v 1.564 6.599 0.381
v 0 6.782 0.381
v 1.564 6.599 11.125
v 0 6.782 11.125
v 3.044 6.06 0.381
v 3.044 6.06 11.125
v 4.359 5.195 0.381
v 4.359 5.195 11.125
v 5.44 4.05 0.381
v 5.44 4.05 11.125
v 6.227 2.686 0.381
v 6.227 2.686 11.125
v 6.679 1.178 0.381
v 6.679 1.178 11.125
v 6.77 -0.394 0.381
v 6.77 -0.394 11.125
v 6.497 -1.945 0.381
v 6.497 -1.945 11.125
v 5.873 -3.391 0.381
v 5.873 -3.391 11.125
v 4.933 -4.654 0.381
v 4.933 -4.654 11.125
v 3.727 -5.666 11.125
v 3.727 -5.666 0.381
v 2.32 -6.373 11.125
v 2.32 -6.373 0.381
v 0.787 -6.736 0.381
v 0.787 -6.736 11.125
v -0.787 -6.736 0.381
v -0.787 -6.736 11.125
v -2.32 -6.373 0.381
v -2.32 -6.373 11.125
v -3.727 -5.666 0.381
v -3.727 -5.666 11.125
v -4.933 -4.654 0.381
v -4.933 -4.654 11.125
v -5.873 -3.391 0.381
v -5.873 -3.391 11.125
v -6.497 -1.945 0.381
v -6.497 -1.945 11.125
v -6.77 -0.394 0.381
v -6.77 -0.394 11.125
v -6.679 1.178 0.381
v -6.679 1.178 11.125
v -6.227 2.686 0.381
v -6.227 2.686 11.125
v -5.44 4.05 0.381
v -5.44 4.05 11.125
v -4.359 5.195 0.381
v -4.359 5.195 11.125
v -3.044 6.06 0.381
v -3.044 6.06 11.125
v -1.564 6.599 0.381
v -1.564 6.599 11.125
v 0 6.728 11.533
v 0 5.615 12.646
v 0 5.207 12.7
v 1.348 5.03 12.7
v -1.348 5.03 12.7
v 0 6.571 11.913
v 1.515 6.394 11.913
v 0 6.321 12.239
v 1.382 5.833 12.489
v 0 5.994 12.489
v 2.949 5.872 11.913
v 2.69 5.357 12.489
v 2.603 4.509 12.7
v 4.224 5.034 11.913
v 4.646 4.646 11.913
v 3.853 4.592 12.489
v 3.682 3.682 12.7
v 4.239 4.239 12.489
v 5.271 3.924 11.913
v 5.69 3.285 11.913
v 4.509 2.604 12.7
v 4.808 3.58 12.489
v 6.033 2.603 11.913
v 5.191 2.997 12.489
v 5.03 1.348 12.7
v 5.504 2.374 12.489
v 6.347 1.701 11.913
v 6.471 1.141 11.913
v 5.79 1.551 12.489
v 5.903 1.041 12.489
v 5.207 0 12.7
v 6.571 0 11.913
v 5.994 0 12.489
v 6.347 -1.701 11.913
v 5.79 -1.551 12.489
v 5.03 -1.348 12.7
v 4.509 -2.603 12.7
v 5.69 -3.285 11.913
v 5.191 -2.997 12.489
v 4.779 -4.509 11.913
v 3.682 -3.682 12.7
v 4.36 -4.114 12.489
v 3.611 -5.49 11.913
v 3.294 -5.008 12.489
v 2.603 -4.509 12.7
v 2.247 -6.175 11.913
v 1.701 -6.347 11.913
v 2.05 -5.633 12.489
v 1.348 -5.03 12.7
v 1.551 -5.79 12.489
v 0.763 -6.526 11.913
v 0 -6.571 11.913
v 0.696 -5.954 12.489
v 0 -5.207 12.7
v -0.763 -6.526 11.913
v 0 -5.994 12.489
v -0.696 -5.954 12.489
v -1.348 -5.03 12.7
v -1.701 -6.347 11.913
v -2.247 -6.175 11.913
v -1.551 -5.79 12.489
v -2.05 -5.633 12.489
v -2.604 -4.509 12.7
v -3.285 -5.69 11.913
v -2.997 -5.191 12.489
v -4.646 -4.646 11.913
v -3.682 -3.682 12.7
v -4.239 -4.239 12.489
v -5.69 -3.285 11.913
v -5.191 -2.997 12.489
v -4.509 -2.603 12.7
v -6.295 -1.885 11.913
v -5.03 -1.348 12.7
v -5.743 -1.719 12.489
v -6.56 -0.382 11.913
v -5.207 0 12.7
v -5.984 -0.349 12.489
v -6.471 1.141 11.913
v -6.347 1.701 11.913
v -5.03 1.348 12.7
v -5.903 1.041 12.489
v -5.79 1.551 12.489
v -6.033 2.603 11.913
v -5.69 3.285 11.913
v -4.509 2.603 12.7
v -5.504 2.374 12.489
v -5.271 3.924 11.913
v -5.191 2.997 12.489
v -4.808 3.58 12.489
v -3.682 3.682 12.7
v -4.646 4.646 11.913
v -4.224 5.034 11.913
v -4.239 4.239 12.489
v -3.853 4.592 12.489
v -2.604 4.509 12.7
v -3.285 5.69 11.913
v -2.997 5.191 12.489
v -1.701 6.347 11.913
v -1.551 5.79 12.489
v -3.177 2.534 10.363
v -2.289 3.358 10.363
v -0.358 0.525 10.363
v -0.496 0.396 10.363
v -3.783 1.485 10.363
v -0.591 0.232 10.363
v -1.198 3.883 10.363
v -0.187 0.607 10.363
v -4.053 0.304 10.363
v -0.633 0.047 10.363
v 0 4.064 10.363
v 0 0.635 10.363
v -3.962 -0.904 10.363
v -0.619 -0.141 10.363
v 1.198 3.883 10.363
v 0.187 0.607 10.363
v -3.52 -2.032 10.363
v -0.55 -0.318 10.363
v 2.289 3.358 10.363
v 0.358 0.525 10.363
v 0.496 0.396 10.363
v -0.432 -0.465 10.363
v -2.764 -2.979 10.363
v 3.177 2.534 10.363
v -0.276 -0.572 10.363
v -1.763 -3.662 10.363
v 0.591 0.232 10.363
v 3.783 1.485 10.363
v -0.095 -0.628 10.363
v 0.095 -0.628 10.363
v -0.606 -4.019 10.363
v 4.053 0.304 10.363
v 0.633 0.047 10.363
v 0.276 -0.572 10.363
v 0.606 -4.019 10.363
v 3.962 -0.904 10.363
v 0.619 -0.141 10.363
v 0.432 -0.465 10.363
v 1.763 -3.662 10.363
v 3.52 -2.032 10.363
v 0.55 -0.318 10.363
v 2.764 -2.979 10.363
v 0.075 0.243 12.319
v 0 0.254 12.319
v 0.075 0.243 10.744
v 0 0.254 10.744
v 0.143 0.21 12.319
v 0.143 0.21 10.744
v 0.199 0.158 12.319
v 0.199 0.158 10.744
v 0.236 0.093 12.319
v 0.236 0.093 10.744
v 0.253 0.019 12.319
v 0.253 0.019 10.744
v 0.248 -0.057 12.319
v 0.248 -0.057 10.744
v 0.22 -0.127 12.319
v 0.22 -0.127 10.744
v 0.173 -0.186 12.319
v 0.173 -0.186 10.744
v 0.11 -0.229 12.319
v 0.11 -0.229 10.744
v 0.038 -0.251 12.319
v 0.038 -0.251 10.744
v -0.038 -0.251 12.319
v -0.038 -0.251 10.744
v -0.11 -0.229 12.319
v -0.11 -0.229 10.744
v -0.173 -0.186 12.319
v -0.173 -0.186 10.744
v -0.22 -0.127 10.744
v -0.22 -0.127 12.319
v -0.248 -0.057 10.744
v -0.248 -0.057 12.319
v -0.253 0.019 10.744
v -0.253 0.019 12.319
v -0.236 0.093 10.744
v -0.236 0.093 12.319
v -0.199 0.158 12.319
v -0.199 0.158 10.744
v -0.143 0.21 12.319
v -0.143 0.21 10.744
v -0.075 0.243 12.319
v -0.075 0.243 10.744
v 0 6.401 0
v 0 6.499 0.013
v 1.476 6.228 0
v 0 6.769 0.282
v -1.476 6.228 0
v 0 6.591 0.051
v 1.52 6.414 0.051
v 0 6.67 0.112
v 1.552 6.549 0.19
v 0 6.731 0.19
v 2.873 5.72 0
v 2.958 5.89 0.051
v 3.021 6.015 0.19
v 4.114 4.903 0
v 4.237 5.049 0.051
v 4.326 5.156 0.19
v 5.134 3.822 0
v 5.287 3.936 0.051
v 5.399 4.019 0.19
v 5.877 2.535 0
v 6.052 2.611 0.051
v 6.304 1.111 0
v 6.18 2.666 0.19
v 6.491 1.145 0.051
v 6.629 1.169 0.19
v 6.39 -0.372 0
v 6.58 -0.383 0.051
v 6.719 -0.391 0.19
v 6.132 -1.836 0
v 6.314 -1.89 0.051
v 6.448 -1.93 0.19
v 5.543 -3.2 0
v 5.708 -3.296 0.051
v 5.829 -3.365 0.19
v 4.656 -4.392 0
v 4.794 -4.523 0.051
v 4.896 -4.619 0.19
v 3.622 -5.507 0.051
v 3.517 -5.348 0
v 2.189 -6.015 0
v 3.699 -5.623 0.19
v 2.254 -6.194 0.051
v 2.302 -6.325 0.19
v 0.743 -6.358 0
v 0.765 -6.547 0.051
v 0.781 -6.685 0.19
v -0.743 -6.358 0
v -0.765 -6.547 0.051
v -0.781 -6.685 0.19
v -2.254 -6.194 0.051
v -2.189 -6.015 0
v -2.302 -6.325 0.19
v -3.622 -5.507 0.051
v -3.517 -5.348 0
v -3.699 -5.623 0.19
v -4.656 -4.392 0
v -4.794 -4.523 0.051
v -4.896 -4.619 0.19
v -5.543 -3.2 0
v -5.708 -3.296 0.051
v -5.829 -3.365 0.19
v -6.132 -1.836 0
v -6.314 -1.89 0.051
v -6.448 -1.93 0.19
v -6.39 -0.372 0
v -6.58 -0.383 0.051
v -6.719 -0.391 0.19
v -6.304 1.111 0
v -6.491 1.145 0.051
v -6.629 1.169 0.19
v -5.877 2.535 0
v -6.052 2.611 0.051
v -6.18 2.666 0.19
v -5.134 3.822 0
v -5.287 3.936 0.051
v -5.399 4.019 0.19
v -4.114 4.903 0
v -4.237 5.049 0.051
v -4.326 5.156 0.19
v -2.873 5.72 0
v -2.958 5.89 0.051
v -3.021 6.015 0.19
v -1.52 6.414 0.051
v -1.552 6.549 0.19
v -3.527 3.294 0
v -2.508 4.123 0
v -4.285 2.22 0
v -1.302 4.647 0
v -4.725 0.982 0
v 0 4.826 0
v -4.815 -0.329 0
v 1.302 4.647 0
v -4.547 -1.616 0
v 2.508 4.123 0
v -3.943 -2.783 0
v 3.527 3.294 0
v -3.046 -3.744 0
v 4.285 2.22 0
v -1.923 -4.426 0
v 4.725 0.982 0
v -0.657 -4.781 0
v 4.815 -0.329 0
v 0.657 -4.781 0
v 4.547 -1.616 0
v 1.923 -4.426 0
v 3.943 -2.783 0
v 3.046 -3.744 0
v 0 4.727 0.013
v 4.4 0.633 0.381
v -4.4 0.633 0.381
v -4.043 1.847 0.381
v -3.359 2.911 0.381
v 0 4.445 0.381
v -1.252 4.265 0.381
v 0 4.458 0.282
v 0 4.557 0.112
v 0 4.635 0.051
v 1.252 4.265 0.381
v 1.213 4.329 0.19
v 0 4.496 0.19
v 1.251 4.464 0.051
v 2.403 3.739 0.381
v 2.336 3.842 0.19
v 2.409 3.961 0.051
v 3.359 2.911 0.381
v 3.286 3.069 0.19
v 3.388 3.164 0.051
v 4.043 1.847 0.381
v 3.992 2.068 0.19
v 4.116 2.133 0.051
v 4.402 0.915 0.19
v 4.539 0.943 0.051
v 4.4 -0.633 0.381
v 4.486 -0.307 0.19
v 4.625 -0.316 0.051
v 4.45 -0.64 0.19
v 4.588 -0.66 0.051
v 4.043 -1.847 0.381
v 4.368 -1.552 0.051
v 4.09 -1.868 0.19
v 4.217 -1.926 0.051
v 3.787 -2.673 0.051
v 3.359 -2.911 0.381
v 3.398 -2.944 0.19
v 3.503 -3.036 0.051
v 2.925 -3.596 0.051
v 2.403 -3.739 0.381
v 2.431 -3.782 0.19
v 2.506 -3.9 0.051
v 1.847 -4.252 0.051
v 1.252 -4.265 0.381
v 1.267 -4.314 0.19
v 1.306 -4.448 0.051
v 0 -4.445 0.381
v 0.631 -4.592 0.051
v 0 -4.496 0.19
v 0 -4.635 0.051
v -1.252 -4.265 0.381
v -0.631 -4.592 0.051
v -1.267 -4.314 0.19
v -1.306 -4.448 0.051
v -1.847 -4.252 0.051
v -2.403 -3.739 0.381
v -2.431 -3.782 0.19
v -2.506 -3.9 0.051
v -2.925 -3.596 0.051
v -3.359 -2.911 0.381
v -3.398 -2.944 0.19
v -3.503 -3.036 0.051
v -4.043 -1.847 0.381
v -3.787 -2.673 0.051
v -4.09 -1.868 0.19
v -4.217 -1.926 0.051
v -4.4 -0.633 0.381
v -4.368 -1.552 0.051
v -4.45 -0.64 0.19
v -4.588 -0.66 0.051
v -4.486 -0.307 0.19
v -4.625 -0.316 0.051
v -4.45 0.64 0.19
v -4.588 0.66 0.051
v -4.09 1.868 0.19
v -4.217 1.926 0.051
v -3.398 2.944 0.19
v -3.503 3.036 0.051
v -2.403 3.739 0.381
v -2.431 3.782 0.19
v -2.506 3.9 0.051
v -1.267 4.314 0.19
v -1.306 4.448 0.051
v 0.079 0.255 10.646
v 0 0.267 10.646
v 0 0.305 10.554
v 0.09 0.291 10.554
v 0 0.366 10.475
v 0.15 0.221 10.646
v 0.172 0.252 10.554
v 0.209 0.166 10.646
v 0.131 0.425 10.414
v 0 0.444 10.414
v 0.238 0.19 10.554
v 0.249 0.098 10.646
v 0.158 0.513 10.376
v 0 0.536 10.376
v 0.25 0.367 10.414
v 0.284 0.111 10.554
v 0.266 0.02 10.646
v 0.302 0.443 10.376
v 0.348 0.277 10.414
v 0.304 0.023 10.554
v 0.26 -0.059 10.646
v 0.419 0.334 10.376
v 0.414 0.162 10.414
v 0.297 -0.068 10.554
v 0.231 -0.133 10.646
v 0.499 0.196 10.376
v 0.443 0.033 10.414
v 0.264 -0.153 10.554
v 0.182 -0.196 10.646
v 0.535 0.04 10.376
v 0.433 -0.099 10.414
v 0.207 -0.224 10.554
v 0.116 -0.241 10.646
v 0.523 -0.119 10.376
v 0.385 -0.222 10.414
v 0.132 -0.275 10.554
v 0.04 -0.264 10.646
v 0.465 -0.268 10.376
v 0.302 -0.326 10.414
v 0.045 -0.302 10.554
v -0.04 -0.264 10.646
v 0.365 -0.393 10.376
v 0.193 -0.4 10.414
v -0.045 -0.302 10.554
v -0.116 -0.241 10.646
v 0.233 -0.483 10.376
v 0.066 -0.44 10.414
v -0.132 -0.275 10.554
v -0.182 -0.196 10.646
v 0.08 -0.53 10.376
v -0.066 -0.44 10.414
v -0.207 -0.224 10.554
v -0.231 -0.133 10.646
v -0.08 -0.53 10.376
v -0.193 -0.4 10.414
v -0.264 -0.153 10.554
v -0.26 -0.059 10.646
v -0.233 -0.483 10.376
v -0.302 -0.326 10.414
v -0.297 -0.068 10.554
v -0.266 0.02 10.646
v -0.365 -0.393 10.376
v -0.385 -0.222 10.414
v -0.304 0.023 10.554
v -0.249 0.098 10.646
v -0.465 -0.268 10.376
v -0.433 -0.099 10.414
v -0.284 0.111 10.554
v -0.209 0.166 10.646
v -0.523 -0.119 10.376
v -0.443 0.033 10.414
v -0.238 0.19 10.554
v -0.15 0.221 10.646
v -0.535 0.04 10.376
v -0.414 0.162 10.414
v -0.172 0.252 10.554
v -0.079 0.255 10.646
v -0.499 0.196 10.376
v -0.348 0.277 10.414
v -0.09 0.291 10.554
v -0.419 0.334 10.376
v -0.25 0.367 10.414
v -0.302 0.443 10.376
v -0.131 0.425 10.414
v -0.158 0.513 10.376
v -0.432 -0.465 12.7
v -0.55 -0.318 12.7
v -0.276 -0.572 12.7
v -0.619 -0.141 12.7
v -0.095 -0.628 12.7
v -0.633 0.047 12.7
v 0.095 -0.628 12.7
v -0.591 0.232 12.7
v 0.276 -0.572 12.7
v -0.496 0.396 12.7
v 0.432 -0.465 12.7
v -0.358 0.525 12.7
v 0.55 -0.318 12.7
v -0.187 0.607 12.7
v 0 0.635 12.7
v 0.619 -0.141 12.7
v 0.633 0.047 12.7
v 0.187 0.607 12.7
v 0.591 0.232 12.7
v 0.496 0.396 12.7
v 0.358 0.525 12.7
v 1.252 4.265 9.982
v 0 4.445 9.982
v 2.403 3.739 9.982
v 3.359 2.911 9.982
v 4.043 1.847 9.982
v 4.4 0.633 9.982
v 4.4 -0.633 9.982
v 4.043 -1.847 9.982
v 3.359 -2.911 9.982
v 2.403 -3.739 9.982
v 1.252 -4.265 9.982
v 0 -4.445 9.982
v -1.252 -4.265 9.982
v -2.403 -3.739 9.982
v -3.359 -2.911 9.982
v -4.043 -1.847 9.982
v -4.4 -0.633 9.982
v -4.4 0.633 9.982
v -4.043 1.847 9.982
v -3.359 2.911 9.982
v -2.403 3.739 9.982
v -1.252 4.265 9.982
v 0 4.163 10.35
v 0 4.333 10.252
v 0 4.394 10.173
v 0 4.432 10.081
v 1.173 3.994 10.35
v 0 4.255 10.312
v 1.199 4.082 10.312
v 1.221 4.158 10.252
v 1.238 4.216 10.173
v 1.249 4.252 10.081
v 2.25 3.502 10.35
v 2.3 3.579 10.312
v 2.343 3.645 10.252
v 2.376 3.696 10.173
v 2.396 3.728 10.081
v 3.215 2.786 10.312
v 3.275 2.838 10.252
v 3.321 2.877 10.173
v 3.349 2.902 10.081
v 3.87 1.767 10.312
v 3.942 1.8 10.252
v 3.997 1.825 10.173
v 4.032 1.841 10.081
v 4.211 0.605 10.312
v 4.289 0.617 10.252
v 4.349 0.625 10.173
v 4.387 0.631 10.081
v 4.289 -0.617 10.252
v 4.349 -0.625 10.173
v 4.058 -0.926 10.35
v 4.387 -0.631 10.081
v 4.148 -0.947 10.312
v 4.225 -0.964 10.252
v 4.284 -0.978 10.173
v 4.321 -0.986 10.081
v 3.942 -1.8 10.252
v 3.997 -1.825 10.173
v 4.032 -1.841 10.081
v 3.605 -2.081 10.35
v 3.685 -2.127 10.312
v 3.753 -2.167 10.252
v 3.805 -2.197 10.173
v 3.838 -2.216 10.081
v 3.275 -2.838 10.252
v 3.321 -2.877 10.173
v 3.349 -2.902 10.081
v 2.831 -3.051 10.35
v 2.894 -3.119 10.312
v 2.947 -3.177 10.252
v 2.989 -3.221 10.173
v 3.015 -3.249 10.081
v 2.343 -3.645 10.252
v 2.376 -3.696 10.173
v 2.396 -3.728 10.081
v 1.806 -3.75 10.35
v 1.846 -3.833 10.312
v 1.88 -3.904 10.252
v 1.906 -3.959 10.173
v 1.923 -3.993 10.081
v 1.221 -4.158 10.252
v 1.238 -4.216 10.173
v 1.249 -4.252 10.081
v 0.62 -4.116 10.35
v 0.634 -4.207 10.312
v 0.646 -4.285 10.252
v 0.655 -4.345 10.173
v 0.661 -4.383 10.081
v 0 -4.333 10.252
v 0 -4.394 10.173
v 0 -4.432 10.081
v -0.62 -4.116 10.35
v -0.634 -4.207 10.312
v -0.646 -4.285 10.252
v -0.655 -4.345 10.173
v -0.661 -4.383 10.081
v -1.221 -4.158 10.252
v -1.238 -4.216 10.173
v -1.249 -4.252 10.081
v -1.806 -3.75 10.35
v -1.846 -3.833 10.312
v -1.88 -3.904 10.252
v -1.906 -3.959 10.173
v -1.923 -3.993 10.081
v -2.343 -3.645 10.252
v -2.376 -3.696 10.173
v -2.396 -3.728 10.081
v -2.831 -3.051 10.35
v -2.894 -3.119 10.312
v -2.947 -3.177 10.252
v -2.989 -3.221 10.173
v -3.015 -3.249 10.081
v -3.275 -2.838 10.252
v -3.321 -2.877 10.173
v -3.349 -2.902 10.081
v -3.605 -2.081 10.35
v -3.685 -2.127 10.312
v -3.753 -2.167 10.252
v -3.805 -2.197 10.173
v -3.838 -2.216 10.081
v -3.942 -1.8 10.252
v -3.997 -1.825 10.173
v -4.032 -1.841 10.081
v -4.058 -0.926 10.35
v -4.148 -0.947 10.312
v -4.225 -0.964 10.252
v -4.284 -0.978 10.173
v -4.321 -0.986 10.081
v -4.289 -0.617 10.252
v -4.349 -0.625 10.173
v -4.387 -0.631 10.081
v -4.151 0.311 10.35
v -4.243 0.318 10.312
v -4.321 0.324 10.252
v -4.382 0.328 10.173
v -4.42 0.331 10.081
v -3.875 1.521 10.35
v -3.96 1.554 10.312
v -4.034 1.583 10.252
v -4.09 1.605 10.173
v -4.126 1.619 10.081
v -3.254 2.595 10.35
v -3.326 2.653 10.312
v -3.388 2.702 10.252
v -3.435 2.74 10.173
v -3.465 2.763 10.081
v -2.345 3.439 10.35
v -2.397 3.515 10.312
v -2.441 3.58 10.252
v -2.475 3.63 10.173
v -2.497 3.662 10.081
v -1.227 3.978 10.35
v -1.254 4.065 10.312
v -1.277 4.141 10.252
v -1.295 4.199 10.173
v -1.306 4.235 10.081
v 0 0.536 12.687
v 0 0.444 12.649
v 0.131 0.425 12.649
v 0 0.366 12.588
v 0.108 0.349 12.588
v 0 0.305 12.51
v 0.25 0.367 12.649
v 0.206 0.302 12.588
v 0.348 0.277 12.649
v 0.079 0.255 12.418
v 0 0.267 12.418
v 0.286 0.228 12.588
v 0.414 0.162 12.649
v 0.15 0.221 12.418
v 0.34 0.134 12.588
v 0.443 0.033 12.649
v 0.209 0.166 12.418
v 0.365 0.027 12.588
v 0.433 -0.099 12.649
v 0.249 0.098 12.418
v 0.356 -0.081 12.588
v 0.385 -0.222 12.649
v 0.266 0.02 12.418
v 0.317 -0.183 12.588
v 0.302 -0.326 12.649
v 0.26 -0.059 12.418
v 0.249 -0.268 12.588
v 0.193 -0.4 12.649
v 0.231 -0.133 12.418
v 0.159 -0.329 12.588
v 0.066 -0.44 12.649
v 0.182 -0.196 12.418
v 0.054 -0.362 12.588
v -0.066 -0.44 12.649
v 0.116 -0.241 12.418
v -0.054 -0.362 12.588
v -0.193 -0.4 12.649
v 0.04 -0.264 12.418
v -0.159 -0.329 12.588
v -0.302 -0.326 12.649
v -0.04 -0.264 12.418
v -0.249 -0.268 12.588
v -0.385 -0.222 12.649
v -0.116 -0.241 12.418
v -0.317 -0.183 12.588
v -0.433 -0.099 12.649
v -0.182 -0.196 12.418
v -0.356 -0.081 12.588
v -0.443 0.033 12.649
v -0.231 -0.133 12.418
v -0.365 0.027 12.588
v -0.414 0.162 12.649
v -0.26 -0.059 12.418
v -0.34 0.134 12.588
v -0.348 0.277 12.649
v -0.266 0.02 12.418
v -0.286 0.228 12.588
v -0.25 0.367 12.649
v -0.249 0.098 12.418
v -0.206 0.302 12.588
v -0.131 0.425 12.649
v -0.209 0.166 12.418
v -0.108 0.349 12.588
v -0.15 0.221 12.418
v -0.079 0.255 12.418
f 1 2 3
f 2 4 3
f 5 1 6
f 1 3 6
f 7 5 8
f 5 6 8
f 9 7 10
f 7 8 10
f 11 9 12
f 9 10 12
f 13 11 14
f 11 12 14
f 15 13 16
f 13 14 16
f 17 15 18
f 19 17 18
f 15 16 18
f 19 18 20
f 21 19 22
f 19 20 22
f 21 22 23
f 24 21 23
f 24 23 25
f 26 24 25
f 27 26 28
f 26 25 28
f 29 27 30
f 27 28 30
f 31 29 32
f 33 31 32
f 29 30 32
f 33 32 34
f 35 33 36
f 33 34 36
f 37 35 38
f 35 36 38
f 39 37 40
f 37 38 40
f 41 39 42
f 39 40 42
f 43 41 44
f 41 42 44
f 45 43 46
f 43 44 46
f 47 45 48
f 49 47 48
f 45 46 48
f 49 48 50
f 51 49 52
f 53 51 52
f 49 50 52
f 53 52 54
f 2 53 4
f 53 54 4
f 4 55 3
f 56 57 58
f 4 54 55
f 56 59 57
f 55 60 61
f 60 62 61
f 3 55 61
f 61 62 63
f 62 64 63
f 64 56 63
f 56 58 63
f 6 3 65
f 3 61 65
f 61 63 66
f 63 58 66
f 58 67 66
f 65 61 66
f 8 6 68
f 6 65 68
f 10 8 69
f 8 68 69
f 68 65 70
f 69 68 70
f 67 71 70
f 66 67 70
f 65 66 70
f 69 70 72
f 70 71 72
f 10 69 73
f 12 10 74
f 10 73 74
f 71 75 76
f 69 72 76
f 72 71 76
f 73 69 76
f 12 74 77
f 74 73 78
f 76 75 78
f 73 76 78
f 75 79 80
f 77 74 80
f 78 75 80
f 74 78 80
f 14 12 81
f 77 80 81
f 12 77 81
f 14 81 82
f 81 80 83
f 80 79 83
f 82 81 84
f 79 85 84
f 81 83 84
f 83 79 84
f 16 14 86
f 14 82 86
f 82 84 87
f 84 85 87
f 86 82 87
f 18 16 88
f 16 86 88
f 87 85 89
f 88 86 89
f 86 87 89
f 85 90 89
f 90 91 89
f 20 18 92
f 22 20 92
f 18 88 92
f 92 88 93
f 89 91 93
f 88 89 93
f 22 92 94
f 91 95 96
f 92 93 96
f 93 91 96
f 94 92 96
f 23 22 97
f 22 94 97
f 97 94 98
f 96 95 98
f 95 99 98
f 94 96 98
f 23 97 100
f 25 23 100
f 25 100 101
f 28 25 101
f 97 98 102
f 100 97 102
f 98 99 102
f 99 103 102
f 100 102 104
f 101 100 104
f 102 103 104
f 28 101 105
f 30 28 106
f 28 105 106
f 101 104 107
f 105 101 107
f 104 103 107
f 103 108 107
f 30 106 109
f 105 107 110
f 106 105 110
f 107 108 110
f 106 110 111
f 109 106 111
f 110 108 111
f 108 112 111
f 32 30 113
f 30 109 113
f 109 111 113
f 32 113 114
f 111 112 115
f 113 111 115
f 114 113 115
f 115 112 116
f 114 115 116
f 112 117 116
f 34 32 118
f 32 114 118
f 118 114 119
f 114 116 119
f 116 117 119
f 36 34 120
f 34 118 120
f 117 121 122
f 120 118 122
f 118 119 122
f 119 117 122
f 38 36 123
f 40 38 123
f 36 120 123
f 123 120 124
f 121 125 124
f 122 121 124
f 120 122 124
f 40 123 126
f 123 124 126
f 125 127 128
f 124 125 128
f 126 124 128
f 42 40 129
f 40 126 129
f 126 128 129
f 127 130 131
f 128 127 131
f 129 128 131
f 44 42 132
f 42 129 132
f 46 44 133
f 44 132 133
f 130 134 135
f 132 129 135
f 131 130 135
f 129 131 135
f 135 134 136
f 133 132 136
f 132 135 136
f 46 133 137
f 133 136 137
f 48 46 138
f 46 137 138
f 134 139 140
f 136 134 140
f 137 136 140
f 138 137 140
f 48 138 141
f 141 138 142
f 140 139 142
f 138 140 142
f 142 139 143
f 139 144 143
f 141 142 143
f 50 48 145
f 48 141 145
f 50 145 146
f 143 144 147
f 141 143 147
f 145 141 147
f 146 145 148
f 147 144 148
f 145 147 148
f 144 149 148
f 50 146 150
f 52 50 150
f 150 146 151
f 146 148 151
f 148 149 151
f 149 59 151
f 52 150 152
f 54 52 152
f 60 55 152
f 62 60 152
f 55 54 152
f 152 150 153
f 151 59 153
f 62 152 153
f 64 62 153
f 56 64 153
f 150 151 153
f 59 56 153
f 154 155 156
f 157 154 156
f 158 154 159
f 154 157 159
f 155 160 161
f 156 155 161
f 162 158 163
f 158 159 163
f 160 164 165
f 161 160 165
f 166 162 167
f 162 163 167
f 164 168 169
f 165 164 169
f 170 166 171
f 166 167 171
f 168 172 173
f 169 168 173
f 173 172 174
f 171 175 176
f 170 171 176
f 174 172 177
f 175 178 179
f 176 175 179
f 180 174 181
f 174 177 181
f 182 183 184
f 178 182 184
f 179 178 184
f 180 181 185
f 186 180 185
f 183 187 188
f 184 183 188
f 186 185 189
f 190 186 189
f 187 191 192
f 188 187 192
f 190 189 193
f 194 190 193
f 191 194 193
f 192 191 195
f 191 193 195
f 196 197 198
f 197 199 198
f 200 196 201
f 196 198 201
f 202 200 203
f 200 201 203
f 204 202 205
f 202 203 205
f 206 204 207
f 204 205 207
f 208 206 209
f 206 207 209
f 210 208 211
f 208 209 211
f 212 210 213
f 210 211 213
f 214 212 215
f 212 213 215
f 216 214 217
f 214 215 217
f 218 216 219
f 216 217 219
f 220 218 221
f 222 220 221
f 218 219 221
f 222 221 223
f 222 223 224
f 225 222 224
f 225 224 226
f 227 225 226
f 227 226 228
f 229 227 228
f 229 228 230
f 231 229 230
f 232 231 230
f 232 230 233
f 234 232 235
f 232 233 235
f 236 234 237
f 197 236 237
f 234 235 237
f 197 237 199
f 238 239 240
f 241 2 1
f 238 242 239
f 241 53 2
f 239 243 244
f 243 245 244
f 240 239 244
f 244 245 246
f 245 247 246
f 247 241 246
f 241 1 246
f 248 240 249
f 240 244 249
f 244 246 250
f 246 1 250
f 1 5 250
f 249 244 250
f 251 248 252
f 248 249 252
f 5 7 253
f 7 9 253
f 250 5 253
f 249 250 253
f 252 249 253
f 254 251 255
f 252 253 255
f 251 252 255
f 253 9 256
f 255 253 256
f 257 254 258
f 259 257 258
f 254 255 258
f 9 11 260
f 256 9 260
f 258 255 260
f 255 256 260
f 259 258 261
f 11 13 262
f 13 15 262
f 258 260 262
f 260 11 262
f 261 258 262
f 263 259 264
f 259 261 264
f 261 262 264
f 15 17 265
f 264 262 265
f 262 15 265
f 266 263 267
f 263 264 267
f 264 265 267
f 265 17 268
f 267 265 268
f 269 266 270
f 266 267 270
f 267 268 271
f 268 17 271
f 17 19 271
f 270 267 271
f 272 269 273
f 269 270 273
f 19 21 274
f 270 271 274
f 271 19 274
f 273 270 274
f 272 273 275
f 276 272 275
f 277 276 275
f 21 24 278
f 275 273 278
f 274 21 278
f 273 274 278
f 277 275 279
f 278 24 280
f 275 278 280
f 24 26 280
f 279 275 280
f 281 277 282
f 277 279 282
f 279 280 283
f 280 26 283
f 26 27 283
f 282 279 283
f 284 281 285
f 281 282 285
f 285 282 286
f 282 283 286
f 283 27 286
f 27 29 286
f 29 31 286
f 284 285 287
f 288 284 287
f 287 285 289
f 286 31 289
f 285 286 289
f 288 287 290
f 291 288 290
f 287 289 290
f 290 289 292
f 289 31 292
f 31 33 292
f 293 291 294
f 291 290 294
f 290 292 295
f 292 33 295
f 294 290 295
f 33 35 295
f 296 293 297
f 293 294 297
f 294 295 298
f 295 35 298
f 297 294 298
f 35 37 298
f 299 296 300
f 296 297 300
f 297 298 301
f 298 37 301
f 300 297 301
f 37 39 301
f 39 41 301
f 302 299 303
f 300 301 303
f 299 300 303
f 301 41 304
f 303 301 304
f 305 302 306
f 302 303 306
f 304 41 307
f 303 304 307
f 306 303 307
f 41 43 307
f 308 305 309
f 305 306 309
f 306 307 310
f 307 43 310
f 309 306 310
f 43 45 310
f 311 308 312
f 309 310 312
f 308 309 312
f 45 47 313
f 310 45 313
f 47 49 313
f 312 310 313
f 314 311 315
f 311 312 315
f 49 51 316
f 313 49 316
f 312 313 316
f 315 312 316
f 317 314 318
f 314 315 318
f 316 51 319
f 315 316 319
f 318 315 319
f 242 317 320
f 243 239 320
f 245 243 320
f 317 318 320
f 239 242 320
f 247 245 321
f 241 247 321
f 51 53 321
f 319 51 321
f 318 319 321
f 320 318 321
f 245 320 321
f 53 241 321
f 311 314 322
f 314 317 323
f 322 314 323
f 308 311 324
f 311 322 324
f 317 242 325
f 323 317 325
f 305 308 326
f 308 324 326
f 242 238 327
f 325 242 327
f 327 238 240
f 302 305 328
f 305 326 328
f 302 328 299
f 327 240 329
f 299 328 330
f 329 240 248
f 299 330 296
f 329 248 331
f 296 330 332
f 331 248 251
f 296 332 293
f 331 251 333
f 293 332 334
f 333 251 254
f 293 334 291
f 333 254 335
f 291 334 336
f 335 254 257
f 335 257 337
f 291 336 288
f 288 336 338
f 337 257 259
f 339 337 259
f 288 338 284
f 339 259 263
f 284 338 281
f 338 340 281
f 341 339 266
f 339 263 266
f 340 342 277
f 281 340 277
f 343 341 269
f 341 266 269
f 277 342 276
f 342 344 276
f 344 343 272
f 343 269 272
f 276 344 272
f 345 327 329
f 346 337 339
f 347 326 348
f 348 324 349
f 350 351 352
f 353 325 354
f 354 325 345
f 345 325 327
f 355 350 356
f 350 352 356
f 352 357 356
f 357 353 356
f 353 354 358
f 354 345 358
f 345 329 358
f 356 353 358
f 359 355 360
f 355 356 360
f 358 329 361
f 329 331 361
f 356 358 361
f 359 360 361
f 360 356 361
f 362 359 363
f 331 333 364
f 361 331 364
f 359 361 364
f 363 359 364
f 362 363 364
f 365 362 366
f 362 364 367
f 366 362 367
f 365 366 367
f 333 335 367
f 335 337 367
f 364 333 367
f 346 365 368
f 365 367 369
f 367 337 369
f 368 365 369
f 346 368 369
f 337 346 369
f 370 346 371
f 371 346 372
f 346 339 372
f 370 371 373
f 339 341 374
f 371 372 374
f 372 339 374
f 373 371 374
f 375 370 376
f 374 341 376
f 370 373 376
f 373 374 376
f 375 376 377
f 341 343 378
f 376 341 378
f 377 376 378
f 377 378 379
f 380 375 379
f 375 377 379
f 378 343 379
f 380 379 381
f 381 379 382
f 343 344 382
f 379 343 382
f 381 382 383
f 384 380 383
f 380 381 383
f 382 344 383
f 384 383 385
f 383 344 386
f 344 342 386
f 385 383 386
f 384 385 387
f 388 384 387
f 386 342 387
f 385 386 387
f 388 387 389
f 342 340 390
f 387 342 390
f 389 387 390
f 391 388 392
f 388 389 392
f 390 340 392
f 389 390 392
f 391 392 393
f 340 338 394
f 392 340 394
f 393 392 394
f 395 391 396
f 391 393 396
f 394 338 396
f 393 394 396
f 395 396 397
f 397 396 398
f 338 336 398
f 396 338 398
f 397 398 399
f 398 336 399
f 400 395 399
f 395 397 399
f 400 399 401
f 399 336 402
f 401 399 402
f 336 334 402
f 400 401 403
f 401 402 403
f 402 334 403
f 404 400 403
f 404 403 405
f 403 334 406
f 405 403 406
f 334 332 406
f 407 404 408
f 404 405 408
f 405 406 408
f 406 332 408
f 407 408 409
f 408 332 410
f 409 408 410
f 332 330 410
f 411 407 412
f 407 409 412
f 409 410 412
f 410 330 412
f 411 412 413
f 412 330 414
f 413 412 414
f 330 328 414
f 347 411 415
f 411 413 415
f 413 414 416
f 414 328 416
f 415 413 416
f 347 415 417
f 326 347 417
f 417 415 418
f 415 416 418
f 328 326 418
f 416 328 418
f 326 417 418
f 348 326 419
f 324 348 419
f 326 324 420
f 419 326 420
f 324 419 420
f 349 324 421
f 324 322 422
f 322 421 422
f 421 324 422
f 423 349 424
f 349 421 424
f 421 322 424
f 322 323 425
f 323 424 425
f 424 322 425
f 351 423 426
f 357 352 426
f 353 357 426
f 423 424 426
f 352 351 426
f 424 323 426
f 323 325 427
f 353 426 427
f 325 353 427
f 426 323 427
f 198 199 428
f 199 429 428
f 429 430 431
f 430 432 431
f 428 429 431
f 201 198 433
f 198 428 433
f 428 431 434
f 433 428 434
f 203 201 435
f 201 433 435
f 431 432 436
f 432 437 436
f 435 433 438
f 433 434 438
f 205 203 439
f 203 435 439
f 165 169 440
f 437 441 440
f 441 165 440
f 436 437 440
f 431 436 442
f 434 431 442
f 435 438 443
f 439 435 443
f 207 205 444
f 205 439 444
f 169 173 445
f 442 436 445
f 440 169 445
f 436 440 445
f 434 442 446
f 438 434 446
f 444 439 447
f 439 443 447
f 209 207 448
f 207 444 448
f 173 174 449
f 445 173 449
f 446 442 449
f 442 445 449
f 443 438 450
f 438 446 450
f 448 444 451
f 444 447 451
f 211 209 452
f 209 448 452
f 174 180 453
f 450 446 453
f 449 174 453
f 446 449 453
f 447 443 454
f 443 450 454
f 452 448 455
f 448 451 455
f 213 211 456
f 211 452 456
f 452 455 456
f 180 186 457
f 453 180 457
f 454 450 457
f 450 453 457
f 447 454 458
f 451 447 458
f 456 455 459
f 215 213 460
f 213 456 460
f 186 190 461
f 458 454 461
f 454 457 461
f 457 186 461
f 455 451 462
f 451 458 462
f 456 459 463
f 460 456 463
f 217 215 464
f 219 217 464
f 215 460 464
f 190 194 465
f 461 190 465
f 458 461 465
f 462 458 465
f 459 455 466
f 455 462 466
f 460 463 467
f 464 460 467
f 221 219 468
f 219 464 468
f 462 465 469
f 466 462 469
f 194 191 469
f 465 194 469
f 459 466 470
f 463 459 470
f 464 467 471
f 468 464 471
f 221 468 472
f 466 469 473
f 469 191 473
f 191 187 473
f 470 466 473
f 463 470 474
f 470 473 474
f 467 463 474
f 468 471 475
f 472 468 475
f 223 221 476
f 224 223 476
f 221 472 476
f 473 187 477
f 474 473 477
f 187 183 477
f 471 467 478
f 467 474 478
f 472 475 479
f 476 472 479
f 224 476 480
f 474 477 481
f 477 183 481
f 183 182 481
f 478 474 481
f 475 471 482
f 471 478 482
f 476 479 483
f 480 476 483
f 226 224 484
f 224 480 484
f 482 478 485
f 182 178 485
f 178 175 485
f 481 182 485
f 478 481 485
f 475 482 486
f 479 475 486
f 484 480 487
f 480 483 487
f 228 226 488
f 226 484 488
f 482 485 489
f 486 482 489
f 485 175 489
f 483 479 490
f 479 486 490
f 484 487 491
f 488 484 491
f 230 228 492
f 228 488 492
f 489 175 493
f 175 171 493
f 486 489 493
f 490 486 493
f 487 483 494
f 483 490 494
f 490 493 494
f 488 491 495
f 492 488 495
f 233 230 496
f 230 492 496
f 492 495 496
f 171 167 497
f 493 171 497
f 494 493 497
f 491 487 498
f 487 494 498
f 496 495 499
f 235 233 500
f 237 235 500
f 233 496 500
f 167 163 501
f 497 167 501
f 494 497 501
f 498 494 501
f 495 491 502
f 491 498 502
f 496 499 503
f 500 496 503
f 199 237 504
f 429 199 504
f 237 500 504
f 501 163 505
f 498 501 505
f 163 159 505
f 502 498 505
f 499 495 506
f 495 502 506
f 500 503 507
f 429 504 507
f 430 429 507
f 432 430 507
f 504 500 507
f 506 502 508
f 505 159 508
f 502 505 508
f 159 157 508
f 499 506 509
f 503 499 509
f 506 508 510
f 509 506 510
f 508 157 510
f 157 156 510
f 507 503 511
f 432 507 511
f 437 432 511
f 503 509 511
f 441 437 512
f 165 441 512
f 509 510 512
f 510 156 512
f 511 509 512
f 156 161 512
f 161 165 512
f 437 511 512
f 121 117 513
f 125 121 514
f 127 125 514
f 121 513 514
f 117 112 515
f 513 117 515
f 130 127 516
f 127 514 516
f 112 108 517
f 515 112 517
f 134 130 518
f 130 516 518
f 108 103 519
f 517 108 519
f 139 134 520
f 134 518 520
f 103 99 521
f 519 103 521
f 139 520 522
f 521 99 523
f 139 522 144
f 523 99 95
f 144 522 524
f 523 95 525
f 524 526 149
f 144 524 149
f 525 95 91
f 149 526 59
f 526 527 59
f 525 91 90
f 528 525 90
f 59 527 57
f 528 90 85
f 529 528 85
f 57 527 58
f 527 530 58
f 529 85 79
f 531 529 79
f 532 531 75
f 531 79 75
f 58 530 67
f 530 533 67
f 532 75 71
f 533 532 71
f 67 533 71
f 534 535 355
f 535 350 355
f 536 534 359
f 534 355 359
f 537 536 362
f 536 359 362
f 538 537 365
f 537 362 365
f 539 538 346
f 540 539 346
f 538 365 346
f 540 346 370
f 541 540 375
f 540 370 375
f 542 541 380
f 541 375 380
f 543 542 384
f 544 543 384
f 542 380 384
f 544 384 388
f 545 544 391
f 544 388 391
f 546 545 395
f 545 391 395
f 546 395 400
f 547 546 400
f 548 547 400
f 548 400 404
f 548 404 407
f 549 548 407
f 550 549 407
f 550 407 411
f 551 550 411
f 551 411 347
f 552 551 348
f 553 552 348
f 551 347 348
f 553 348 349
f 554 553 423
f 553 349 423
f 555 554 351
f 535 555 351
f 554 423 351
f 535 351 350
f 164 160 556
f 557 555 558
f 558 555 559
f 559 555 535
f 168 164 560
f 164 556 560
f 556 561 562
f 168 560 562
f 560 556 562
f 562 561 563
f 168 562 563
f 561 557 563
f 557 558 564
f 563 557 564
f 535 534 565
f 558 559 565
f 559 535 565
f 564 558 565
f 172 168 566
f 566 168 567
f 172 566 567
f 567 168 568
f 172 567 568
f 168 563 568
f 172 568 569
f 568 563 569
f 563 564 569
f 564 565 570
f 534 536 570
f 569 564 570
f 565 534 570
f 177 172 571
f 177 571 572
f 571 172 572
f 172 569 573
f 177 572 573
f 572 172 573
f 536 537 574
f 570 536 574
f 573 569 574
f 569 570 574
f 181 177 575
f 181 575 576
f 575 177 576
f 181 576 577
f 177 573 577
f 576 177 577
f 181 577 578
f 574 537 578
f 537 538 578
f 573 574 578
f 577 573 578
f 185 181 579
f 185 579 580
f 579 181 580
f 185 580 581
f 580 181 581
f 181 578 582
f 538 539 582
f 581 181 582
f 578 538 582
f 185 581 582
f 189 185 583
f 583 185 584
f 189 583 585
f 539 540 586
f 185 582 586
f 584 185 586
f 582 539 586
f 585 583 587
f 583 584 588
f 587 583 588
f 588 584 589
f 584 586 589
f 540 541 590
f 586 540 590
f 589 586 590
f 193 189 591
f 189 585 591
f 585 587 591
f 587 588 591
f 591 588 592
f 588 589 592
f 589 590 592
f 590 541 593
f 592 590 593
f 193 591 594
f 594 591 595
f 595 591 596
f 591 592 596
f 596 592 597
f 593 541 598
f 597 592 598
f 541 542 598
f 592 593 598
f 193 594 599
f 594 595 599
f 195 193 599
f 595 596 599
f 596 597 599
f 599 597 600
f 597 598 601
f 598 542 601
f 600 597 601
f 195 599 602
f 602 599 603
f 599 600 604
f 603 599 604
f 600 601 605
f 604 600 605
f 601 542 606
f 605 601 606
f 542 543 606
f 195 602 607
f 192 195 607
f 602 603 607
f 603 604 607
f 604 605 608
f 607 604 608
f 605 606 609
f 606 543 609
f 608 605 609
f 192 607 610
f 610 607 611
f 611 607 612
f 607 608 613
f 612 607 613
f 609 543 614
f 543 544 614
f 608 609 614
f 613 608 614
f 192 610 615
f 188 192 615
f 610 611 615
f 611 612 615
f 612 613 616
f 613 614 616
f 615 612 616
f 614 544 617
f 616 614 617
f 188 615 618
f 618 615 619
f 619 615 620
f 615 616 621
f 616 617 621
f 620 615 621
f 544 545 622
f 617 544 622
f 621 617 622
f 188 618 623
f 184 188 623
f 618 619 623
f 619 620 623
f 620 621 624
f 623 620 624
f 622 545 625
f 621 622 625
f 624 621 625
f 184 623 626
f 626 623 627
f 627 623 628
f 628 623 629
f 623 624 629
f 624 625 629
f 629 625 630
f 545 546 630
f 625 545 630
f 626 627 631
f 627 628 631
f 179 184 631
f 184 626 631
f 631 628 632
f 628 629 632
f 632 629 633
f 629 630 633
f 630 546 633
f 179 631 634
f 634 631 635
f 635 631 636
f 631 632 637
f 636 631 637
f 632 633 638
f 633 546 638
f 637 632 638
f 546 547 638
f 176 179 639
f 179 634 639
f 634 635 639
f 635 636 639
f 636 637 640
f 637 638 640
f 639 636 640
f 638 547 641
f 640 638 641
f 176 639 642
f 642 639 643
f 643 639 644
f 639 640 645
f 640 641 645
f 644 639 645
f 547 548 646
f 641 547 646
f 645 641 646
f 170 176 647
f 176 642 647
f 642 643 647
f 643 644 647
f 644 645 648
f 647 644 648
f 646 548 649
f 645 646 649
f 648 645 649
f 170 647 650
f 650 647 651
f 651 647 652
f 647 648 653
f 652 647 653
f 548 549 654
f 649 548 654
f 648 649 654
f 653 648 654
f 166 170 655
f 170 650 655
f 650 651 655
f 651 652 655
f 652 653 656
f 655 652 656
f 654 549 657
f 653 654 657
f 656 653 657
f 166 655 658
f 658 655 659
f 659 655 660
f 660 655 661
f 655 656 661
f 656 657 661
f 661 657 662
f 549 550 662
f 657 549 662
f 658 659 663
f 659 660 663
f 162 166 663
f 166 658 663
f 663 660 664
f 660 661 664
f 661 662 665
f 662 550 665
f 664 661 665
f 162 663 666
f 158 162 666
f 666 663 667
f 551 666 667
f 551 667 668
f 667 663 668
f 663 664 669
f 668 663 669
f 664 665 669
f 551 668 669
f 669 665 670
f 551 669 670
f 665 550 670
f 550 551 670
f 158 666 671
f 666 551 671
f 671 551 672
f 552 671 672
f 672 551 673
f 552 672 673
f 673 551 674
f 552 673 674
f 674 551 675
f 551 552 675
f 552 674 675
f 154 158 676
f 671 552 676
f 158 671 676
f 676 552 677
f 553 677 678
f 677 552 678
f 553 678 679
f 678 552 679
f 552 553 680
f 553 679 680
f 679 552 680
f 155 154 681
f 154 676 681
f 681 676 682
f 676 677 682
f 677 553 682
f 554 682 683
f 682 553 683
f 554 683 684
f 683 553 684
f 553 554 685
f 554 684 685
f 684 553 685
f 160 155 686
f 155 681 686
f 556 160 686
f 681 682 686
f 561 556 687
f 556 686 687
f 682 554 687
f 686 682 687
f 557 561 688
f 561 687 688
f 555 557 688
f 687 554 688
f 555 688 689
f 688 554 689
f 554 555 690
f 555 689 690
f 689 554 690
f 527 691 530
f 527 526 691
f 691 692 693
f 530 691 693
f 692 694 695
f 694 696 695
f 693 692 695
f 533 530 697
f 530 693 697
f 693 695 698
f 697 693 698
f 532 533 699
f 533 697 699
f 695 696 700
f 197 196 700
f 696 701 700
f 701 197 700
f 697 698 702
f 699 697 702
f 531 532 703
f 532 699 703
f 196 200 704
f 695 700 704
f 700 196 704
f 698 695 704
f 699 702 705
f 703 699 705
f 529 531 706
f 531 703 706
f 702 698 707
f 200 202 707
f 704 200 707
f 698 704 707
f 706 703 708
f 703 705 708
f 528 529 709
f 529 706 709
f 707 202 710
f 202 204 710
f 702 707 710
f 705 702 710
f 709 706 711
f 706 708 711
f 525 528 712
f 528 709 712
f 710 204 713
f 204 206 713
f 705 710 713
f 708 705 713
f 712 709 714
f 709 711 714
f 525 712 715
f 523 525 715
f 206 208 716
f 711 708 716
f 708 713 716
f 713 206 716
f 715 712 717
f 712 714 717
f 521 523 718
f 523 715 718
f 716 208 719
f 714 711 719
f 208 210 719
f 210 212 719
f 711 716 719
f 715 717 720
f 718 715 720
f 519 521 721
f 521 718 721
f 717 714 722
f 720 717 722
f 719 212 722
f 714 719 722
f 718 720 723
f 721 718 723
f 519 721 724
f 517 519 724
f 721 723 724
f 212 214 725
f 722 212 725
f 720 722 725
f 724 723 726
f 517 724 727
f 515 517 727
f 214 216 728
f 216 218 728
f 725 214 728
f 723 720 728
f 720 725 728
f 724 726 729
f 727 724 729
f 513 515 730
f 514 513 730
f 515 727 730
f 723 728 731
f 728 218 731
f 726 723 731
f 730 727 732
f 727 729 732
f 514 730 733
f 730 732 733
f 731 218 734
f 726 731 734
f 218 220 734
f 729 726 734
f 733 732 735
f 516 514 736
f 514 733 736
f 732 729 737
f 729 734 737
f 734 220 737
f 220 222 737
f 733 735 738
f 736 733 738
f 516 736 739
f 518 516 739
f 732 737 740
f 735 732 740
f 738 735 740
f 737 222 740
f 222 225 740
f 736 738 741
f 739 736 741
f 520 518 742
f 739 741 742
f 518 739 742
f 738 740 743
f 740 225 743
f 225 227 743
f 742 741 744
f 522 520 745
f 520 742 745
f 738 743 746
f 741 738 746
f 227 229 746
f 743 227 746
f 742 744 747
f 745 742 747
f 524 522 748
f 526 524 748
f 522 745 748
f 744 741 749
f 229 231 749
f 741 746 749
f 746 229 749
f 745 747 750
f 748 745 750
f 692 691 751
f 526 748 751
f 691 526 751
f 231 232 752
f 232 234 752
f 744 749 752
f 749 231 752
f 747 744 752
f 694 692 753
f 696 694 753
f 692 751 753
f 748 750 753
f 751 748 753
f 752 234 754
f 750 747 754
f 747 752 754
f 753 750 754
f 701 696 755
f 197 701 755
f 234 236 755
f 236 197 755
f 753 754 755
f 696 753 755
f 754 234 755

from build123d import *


with BuildPart() as f1:
    # F0 (on Right) → F1 (revolve)
    with BuildSketch(Plane.YZ):
        with BuildLine():
            ThreePointArc((4.445, 0.381), (4.556592, 0.111592), (4.826, 0))
            Line((4.826, 0), (6.4008, 0))
            ThreePointArc((6.4008, 0), (6.670208, 0.111592), (6.7818, 0.381))
            Line((6.7818, 0.381), (6.7818, 11.1252))
            ThreePointArc((6.7818, 11.1252), (6.320552, 12.238752), (5.207, 12.7))
            Line((5.207, 12.7), (0.635, 12.7))
            ThreePointArc((0.635, 12.7), (0.365592, 12.588408), (0.254, 12.319))
            Line((0.254, 12.319), (0.254, 10.7442))
            ThreePointArc((0.254, 10.7442), (0.365592, 10.474792), (0.635, 10.3632))
            Line((0.635, 10.3632), (4.064, 10.3632))
            ThreePointArc((4.064, 10.3632), (4.333408, 10.251608), (4.445, 9.9822))
            Line((4.445, 9.9822), (4.445, 0.381))
        make_face()
    revolve(axis=Axis((0, 0, 9.489433), (0, 0, -1)))


solid = f1.part
